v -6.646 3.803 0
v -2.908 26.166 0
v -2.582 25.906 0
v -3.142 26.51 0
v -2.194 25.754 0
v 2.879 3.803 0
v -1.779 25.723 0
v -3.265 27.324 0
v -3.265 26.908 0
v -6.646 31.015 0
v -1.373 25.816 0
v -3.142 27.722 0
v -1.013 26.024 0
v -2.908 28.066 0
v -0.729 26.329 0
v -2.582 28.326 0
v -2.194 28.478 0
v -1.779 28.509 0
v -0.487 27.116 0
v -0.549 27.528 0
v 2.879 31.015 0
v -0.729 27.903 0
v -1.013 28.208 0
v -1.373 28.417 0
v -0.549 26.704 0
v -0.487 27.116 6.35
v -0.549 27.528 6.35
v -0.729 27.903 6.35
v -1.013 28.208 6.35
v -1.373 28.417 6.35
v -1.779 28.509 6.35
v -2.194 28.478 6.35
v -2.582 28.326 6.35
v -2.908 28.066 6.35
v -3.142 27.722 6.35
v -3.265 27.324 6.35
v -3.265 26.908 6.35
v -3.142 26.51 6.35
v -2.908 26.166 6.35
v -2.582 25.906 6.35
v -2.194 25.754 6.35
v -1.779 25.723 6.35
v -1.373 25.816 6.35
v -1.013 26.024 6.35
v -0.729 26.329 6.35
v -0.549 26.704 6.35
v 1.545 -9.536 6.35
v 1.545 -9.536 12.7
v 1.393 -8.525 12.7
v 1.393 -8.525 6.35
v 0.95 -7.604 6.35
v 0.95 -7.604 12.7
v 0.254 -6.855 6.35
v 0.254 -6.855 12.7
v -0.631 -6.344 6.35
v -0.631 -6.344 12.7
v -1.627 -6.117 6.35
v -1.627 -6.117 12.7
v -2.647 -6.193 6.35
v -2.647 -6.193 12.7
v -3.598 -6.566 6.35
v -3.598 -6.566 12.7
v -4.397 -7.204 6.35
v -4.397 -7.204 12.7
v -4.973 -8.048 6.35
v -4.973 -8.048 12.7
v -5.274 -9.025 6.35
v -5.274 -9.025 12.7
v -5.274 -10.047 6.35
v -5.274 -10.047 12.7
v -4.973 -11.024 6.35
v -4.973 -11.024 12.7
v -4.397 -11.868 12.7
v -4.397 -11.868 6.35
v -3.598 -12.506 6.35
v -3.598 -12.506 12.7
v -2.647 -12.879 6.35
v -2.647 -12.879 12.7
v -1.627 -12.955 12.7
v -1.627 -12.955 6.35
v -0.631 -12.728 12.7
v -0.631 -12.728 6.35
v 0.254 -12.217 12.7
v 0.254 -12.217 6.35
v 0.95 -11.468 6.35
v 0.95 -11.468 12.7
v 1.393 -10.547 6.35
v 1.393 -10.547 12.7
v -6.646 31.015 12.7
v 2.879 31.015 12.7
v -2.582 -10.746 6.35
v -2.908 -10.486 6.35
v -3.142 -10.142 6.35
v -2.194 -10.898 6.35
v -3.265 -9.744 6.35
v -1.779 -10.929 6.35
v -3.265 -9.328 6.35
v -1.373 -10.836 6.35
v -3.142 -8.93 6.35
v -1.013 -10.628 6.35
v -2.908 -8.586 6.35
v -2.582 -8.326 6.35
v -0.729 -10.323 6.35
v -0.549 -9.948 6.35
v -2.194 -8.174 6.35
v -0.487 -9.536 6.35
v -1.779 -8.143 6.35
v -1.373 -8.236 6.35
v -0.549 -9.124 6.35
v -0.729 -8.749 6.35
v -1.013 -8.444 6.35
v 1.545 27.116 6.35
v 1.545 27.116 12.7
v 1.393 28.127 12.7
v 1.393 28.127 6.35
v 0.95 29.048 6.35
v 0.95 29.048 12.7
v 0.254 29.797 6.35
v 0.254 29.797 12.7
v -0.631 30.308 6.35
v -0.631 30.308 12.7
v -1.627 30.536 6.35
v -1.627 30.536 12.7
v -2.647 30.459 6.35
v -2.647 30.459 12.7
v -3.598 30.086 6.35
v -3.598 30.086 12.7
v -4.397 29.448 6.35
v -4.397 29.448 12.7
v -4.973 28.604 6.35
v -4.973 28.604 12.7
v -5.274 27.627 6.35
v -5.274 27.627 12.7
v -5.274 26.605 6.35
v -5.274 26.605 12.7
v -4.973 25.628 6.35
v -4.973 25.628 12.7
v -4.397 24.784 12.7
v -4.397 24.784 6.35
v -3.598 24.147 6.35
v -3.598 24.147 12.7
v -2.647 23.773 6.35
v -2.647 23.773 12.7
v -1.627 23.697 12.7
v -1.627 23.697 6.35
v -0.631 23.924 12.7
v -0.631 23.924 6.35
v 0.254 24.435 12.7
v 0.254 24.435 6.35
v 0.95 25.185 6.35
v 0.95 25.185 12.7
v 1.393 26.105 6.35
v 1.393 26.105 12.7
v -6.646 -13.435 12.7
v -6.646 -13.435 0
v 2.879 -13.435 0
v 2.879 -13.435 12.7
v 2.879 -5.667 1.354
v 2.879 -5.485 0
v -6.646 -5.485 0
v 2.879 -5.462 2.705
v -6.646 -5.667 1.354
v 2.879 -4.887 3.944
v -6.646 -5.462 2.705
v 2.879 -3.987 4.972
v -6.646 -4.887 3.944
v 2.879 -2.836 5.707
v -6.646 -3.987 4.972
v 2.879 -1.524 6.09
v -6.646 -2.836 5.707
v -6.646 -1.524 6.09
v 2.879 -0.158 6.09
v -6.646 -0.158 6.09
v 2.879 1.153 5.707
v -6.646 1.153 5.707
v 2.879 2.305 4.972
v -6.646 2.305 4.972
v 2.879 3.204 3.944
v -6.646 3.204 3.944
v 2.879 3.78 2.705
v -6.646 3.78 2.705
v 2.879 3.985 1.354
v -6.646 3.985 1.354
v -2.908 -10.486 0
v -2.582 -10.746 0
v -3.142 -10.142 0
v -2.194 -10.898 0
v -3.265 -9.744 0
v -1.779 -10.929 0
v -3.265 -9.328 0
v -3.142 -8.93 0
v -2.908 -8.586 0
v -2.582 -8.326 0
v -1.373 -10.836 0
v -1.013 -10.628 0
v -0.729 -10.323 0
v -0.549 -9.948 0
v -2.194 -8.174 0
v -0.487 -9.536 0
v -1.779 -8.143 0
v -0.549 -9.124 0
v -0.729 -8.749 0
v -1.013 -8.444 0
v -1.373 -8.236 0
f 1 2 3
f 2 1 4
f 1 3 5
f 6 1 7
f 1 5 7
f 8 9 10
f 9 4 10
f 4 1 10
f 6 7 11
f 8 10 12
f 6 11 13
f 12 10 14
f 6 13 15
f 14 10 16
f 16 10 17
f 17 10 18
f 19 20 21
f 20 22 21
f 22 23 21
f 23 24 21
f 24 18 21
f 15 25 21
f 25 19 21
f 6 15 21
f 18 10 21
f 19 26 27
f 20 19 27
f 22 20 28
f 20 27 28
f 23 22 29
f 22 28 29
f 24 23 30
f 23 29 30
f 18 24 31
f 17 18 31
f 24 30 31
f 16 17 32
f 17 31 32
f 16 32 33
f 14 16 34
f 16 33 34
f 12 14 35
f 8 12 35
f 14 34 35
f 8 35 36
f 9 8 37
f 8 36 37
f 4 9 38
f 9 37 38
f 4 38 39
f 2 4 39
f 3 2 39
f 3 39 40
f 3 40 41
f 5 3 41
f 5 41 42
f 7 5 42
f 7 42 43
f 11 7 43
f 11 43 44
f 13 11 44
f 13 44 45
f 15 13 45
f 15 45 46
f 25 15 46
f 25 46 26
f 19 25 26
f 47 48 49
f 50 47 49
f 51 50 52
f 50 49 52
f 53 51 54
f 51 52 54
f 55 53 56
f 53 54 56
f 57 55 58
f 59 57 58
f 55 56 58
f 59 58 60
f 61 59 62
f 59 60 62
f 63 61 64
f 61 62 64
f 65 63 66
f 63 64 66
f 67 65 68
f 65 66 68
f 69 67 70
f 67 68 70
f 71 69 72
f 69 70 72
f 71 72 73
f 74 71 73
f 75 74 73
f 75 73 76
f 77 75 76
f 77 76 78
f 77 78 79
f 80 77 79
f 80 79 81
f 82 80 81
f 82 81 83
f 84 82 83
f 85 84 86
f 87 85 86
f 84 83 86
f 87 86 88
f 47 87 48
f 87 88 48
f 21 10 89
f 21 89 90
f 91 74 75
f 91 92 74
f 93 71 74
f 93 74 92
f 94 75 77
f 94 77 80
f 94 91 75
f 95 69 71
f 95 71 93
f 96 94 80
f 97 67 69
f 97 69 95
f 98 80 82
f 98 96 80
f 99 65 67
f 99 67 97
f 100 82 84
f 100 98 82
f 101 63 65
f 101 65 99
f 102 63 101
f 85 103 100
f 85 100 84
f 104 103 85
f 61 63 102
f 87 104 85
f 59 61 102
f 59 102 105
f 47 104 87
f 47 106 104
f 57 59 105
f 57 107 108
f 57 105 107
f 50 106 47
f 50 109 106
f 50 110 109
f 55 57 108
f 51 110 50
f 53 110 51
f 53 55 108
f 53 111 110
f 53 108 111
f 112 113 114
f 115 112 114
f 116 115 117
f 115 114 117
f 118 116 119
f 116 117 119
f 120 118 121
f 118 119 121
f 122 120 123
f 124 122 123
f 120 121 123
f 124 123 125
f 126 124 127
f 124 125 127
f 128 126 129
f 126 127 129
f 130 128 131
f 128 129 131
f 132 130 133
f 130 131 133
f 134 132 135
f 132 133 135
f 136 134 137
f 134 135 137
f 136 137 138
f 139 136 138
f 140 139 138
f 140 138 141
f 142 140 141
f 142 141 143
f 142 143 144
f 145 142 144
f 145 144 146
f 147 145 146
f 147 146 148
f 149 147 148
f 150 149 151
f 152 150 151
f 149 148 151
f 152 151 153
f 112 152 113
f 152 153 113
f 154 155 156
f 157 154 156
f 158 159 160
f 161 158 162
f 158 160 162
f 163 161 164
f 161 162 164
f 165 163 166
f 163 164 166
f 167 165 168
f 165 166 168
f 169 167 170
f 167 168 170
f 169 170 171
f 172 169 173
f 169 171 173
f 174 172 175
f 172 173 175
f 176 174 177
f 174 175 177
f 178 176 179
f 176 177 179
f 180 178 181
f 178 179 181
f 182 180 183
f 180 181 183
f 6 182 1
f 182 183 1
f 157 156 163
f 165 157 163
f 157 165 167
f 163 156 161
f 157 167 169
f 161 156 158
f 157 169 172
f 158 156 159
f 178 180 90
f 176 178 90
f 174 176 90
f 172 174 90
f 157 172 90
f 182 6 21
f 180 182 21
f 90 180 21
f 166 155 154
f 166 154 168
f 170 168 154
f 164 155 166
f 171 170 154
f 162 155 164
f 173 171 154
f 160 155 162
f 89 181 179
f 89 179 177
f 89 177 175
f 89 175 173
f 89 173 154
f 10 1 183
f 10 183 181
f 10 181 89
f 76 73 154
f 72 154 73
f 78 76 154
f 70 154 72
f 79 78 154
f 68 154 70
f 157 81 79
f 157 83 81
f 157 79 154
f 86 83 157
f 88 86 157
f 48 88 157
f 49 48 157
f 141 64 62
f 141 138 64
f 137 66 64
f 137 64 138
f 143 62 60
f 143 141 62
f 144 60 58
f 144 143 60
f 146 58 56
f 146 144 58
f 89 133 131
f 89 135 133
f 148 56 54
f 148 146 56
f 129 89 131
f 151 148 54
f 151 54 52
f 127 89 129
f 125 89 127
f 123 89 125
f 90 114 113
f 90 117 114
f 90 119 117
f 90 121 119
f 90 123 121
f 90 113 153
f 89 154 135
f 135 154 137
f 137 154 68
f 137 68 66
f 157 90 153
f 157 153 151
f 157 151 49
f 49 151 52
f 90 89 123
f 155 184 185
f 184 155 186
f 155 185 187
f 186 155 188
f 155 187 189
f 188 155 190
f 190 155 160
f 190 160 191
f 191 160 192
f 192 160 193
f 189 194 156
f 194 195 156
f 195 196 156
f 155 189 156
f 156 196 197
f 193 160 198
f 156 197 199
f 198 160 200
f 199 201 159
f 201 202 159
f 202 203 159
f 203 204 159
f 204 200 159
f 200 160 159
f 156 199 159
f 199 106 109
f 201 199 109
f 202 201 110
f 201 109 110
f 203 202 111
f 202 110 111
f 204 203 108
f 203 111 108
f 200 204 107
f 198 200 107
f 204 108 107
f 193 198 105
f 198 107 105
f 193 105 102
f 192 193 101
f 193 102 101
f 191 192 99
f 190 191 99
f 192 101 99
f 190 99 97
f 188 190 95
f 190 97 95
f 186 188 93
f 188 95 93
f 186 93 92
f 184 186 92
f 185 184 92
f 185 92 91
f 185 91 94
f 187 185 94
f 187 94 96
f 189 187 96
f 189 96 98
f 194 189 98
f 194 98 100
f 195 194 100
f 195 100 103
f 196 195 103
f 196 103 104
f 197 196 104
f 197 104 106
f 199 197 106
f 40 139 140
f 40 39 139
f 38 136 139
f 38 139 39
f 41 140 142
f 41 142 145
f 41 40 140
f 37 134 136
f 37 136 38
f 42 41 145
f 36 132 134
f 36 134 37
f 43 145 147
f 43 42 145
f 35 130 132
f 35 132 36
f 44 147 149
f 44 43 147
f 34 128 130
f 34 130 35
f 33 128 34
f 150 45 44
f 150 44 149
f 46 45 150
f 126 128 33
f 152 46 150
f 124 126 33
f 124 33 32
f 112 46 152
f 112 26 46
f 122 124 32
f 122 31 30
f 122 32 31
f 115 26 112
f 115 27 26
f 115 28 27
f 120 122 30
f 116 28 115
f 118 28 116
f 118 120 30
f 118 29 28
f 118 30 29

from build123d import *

# Parameters (mm, degrees)
SKETCH1_W           = 9.525
SKETCH1_H           = 44.45
BOSS_EXTRUDE1_DEPTH = 12.7
SKETCH2_R           = 3.429
CUT_EXTRUDE1_DEPTH  = 6.35
SKETCH3_R           = 1.397
CUT_EXTRUDE2_DEPTH  = 33.348528515
SKETCH4_R           = 4.826
SKETCH4_R_2         = 4.7625
CUT_EXTRUDE3_DEPTH  = 35.841784793


with BuildPart() as part:
    # Sketch1 → Boss-Extrude1 (new body)
    with BuildSketch(Plane.XY):
        with Locations((-1.883585653, 8.79006638)):
            Rectangle(SKETCH1_W, SKETCH1_H)
    extrude(amount=BOSS_EXTRUDE1_DEPTH)

    # Sketch2 → Cut-Extrude1 (cut)
    with BuildSketch(Plane.XY.offset(12.7)):
        with Locations((-1.883585653, 27.11616638)):
            Circle(SKETCH2_R)
        with Locations((-1.883585653, -9.53603362)):
            Circle(SKETCH2_R)
    extrude(amount=-CUT_EXTRUDE1_DEPTH, mode=Mode.SUBTRACT)

    # Sketch3 → Cut-Extrude2 (cut, through all)
    with BuildSketch(Plane.XY.offset(6.35)):
        with Locations((-1.883585653, 27.11616638)):
            Circle(SKETCH3_R)
        with Locations((-1.883585653, -9.53603362)):
            Circle(SKETCH3_R)
    extrude(amount=-CUT_EXTRUDE2_DEPTH, mode=Mode.SUBTRACT)

    # Sketch4 → Cut-Extrude3 (cut, through all)
    with BuildSketch(Plane.ZY.offset(6.646085653)):
        with Locations((1.312301335, -0.841200319)):
            Circle(SKETCH4_R)
        with Locations((1.312301335, -0.841200319)):
            Circle(SKETCH4_R_2, mode=Mode.SUBTRACT)
    extrude(amount=-CUT_EXTRUDE3_DEPTH, mode=Mode.SUBTRACT)


with BuildPart() as cut_extrude3_kept_piece:
    # of the separate pieces the step leaves, the one the design keeps (cut_extrude3_pieces_kept)
    add(part.part.solids().sort_by_distance((-6.646085653, 31.01506638, 0))[0])


solid = cut_extrude3_kept_piece.part
